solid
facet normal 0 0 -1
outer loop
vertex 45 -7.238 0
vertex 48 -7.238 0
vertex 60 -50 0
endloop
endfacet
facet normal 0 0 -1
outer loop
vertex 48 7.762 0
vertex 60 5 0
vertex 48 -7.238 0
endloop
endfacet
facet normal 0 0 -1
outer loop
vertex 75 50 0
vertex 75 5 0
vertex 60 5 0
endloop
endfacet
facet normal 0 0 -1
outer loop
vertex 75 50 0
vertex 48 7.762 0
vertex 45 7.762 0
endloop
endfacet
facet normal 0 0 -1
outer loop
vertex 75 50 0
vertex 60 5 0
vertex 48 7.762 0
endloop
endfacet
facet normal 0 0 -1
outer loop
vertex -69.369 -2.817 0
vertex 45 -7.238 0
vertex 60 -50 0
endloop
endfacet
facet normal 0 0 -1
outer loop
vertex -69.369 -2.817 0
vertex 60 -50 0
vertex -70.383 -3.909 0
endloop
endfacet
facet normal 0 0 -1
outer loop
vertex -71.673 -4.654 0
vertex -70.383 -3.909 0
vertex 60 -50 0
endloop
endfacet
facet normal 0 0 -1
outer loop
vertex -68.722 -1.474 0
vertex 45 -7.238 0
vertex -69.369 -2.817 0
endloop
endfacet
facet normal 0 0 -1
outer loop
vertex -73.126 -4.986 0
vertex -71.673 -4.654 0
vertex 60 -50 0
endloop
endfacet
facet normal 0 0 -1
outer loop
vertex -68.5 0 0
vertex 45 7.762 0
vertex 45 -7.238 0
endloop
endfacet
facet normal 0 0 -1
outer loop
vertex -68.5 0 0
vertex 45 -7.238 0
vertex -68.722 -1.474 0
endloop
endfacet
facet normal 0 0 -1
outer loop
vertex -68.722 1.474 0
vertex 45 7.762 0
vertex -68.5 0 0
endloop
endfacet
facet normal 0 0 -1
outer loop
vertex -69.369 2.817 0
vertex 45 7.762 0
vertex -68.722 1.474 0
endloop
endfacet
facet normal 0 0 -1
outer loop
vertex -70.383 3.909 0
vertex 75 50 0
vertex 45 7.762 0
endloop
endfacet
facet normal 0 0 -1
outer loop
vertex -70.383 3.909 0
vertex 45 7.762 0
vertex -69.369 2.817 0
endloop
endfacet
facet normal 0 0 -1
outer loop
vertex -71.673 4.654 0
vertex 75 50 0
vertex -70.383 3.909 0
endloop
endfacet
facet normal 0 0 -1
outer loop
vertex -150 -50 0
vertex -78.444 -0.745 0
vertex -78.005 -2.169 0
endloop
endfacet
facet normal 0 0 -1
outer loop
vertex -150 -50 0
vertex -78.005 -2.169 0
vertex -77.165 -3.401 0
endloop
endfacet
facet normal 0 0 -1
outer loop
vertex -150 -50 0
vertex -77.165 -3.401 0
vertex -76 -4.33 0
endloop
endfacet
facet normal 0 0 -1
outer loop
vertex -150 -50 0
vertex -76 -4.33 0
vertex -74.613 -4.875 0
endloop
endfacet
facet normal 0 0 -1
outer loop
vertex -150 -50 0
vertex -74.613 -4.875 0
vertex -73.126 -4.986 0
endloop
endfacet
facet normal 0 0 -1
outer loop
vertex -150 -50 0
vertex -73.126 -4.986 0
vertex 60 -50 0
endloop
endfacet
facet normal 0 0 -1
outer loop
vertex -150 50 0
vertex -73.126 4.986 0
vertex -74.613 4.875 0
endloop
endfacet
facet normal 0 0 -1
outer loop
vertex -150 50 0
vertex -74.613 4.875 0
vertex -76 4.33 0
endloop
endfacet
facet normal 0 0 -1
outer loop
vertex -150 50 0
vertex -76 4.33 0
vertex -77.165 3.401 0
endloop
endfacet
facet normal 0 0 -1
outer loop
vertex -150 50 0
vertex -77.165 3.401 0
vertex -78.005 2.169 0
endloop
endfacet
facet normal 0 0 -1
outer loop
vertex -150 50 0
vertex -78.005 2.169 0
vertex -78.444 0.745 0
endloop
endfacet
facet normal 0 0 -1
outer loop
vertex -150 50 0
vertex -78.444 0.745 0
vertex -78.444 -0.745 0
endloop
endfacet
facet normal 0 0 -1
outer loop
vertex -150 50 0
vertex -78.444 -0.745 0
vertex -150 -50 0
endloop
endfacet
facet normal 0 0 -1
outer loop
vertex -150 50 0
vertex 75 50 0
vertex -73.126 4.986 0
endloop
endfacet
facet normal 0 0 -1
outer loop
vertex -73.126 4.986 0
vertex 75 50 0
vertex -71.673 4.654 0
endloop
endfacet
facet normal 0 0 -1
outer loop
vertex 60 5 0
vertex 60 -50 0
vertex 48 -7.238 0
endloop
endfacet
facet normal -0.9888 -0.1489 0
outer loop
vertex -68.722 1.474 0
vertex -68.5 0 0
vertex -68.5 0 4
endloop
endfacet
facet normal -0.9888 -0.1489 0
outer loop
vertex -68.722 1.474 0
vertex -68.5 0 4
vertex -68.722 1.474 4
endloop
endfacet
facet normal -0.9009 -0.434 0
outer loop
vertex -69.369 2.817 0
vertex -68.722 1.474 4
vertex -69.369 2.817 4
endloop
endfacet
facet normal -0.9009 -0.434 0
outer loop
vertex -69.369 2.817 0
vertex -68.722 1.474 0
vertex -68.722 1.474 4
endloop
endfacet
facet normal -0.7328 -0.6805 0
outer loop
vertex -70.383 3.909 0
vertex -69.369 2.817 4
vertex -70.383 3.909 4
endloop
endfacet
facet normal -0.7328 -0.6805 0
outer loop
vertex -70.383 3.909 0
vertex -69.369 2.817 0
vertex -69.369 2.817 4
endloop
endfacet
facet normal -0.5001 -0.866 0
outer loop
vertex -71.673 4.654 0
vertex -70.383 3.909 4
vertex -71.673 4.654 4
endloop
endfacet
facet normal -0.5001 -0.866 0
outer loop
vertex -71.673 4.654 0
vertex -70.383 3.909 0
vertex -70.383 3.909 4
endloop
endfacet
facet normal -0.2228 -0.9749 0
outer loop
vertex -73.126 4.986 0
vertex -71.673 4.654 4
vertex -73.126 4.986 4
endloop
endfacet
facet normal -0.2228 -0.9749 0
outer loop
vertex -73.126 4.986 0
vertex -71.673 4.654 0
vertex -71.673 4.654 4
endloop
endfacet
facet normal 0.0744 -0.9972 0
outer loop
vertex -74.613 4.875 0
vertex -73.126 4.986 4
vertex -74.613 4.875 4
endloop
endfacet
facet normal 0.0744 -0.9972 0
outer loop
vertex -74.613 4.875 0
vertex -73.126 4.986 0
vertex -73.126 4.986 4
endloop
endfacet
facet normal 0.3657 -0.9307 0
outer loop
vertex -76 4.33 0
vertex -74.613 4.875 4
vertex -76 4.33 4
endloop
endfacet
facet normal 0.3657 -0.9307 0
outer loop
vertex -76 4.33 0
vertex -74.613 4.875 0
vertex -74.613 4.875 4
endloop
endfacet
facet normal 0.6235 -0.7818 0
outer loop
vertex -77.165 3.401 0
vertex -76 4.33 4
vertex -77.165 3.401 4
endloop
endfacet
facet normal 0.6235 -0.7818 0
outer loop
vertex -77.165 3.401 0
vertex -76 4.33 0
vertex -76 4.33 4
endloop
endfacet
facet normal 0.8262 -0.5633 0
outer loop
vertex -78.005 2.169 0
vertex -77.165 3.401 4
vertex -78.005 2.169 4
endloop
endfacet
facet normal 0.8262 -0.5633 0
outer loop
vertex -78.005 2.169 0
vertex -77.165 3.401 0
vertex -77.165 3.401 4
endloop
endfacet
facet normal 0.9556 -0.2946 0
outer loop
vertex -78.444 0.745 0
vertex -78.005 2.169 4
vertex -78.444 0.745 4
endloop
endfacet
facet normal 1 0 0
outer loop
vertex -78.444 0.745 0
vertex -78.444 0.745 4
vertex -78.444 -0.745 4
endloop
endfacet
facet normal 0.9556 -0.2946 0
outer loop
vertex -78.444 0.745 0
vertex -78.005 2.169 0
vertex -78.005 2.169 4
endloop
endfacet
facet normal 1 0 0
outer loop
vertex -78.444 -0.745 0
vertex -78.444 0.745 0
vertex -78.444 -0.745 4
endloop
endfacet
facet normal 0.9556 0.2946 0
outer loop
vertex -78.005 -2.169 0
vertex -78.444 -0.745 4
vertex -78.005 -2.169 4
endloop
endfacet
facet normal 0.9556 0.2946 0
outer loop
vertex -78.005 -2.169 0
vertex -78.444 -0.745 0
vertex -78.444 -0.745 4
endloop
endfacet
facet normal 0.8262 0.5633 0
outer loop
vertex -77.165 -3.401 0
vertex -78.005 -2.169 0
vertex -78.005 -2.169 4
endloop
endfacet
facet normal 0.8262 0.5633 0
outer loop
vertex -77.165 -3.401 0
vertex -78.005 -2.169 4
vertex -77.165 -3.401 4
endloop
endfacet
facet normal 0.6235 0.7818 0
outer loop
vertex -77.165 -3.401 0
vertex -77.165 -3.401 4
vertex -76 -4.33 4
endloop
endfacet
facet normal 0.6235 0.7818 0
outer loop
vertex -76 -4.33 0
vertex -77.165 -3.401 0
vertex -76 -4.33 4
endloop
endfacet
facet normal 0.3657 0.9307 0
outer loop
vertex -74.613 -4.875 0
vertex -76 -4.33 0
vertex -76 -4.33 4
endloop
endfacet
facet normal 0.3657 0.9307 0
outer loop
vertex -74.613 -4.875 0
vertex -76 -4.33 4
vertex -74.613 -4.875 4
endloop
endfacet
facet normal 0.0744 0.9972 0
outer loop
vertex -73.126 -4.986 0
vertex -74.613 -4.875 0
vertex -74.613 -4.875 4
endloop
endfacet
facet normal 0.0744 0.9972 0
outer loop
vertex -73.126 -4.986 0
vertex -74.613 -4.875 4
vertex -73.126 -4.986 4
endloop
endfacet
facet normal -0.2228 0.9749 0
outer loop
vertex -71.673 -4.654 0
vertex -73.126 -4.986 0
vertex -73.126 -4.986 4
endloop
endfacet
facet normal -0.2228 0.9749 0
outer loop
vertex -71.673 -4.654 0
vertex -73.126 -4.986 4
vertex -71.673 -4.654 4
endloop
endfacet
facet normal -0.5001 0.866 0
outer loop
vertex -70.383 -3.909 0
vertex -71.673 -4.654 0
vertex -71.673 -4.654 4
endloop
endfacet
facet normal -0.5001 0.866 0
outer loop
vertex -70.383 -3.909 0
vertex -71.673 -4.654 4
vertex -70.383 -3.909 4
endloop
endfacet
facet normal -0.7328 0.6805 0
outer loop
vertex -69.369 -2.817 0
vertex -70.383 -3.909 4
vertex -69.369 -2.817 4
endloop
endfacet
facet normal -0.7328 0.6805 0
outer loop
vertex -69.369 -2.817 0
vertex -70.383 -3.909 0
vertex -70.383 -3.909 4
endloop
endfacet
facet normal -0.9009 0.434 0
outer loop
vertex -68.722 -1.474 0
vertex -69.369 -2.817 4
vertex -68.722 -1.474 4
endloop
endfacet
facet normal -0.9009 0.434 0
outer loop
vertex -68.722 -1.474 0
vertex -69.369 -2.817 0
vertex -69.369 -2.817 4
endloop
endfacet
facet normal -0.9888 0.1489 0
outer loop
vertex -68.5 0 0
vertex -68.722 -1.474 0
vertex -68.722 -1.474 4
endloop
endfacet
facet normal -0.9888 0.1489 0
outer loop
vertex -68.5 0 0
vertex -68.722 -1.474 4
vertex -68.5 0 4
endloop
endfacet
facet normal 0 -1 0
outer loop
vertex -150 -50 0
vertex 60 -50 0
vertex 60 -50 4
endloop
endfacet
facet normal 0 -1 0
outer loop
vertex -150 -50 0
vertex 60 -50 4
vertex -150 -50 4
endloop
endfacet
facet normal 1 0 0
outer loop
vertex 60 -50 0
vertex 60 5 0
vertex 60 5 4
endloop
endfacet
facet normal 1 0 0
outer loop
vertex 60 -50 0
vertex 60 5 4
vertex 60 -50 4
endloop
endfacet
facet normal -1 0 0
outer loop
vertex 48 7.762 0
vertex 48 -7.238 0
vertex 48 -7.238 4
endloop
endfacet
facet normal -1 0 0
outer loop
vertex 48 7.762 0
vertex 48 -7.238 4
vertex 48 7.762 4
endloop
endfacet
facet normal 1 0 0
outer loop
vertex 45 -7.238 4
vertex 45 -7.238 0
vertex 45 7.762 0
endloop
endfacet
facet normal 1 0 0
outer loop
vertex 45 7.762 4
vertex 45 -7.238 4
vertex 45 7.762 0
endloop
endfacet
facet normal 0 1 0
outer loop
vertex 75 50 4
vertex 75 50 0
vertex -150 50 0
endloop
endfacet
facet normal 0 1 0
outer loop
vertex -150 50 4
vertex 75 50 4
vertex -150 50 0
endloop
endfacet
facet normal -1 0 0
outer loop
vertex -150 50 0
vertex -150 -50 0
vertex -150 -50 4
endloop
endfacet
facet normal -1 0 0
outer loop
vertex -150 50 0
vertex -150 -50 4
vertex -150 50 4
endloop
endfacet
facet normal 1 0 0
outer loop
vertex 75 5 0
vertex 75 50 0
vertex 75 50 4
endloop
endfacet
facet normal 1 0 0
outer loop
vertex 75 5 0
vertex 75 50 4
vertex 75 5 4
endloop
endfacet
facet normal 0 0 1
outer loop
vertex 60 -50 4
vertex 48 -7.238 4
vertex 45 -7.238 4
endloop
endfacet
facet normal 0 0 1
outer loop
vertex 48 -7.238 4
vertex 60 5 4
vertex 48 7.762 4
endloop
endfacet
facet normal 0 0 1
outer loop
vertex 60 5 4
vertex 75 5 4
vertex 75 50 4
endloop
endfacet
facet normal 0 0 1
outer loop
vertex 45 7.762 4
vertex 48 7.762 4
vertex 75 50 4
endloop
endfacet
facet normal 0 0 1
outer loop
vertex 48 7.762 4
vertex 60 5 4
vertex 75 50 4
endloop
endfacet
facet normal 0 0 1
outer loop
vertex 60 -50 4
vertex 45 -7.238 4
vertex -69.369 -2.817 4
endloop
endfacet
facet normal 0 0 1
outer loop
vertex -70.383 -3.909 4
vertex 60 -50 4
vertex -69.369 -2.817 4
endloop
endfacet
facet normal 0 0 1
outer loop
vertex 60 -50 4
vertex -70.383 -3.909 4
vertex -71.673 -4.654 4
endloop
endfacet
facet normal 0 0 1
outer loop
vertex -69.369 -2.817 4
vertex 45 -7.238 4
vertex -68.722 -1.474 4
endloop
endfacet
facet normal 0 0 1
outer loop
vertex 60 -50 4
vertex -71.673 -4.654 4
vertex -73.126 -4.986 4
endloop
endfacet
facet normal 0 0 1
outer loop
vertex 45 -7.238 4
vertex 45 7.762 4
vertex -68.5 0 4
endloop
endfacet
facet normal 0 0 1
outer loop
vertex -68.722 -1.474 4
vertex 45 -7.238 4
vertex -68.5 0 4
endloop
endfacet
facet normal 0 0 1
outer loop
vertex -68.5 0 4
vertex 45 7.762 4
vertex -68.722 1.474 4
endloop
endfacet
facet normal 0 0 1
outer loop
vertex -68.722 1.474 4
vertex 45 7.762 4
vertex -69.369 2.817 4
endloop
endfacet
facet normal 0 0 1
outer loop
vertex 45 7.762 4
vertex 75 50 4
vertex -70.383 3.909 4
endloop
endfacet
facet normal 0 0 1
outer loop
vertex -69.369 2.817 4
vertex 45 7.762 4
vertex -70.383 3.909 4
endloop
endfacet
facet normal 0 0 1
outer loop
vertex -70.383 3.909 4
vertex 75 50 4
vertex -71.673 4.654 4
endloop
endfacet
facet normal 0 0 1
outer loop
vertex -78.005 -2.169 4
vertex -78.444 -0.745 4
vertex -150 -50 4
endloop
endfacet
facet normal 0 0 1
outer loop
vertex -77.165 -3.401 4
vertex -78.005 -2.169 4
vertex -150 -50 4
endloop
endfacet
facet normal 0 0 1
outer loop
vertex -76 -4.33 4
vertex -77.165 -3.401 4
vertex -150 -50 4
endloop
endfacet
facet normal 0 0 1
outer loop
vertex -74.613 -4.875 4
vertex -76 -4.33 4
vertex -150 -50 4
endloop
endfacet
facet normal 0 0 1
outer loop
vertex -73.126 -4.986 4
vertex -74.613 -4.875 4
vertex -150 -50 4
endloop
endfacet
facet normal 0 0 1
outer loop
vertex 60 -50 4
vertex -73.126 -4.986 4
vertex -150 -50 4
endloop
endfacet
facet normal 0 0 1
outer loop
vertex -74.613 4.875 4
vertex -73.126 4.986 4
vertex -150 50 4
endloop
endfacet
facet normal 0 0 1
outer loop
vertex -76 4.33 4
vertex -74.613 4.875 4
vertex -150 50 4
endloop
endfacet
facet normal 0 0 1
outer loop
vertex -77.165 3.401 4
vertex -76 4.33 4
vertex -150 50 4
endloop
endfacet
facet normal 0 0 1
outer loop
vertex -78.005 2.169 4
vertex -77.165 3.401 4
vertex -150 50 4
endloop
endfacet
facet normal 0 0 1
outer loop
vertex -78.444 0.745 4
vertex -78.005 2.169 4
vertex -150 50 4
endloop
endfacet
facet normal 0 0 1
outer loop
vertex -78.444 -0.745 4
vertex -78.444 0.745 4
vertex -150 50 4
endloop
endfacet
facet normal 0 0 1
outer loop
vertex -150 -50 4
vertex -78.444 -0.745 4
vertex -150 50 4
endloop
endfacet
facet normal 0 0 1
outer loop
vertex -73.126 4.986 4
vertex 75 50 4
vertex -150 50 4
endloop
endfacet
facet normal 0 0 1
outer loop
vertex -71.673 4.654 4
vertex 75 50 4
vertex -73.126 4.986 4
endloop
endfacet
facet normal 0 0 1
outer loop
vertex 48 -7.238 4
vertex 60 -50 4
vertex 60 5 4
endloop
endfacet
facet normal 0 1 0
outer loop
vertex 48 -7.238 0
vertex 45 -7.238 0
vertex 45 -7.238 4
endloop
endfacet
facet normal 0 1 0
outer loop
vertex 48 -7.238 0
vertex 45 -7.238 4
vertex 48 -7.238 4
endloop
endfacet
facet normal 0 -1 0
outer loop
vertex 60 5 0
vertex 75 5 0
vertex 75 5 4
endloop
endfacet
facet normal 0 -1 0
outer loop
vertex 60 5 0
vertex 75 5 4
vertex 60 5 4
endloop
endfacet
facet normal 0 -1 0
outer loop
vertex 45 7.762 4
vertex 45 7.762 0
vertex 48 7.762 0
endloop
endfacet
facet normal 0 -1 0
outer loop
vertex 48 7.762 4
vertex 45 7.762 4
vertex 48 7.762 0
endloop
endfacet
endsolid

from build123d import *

# Parameters (mm, degrees)
SKETCH1_R           = 5
SKETCH1_W           = 3
SKETCH1_H           = 15
BOSS_EXTRUDE1_DEPTH = 4


with BuildPart() as part:
    # Sketch1 → Boss-Extrude1 (new body)
    with BuildSketch(Plane.XY):
        Polygon((60, 50), (75, 50), (75, 5), (60, 5), (60, -50), (-150, -50), (-150, 50), align=None)
        with Locations((-73.5, 0)):
            Circle(SKETCH1_R, mode=Mode.SUBTRACT)
        with Locations((46.5, 0.26206532)):
            Rectangle(SKETCH1_W, SKETCH1_H, mode=Mode.SUBTRACT)
    extrude(amount=BOSS_EXTRUDE1_DEPTH)


solid = part.part
